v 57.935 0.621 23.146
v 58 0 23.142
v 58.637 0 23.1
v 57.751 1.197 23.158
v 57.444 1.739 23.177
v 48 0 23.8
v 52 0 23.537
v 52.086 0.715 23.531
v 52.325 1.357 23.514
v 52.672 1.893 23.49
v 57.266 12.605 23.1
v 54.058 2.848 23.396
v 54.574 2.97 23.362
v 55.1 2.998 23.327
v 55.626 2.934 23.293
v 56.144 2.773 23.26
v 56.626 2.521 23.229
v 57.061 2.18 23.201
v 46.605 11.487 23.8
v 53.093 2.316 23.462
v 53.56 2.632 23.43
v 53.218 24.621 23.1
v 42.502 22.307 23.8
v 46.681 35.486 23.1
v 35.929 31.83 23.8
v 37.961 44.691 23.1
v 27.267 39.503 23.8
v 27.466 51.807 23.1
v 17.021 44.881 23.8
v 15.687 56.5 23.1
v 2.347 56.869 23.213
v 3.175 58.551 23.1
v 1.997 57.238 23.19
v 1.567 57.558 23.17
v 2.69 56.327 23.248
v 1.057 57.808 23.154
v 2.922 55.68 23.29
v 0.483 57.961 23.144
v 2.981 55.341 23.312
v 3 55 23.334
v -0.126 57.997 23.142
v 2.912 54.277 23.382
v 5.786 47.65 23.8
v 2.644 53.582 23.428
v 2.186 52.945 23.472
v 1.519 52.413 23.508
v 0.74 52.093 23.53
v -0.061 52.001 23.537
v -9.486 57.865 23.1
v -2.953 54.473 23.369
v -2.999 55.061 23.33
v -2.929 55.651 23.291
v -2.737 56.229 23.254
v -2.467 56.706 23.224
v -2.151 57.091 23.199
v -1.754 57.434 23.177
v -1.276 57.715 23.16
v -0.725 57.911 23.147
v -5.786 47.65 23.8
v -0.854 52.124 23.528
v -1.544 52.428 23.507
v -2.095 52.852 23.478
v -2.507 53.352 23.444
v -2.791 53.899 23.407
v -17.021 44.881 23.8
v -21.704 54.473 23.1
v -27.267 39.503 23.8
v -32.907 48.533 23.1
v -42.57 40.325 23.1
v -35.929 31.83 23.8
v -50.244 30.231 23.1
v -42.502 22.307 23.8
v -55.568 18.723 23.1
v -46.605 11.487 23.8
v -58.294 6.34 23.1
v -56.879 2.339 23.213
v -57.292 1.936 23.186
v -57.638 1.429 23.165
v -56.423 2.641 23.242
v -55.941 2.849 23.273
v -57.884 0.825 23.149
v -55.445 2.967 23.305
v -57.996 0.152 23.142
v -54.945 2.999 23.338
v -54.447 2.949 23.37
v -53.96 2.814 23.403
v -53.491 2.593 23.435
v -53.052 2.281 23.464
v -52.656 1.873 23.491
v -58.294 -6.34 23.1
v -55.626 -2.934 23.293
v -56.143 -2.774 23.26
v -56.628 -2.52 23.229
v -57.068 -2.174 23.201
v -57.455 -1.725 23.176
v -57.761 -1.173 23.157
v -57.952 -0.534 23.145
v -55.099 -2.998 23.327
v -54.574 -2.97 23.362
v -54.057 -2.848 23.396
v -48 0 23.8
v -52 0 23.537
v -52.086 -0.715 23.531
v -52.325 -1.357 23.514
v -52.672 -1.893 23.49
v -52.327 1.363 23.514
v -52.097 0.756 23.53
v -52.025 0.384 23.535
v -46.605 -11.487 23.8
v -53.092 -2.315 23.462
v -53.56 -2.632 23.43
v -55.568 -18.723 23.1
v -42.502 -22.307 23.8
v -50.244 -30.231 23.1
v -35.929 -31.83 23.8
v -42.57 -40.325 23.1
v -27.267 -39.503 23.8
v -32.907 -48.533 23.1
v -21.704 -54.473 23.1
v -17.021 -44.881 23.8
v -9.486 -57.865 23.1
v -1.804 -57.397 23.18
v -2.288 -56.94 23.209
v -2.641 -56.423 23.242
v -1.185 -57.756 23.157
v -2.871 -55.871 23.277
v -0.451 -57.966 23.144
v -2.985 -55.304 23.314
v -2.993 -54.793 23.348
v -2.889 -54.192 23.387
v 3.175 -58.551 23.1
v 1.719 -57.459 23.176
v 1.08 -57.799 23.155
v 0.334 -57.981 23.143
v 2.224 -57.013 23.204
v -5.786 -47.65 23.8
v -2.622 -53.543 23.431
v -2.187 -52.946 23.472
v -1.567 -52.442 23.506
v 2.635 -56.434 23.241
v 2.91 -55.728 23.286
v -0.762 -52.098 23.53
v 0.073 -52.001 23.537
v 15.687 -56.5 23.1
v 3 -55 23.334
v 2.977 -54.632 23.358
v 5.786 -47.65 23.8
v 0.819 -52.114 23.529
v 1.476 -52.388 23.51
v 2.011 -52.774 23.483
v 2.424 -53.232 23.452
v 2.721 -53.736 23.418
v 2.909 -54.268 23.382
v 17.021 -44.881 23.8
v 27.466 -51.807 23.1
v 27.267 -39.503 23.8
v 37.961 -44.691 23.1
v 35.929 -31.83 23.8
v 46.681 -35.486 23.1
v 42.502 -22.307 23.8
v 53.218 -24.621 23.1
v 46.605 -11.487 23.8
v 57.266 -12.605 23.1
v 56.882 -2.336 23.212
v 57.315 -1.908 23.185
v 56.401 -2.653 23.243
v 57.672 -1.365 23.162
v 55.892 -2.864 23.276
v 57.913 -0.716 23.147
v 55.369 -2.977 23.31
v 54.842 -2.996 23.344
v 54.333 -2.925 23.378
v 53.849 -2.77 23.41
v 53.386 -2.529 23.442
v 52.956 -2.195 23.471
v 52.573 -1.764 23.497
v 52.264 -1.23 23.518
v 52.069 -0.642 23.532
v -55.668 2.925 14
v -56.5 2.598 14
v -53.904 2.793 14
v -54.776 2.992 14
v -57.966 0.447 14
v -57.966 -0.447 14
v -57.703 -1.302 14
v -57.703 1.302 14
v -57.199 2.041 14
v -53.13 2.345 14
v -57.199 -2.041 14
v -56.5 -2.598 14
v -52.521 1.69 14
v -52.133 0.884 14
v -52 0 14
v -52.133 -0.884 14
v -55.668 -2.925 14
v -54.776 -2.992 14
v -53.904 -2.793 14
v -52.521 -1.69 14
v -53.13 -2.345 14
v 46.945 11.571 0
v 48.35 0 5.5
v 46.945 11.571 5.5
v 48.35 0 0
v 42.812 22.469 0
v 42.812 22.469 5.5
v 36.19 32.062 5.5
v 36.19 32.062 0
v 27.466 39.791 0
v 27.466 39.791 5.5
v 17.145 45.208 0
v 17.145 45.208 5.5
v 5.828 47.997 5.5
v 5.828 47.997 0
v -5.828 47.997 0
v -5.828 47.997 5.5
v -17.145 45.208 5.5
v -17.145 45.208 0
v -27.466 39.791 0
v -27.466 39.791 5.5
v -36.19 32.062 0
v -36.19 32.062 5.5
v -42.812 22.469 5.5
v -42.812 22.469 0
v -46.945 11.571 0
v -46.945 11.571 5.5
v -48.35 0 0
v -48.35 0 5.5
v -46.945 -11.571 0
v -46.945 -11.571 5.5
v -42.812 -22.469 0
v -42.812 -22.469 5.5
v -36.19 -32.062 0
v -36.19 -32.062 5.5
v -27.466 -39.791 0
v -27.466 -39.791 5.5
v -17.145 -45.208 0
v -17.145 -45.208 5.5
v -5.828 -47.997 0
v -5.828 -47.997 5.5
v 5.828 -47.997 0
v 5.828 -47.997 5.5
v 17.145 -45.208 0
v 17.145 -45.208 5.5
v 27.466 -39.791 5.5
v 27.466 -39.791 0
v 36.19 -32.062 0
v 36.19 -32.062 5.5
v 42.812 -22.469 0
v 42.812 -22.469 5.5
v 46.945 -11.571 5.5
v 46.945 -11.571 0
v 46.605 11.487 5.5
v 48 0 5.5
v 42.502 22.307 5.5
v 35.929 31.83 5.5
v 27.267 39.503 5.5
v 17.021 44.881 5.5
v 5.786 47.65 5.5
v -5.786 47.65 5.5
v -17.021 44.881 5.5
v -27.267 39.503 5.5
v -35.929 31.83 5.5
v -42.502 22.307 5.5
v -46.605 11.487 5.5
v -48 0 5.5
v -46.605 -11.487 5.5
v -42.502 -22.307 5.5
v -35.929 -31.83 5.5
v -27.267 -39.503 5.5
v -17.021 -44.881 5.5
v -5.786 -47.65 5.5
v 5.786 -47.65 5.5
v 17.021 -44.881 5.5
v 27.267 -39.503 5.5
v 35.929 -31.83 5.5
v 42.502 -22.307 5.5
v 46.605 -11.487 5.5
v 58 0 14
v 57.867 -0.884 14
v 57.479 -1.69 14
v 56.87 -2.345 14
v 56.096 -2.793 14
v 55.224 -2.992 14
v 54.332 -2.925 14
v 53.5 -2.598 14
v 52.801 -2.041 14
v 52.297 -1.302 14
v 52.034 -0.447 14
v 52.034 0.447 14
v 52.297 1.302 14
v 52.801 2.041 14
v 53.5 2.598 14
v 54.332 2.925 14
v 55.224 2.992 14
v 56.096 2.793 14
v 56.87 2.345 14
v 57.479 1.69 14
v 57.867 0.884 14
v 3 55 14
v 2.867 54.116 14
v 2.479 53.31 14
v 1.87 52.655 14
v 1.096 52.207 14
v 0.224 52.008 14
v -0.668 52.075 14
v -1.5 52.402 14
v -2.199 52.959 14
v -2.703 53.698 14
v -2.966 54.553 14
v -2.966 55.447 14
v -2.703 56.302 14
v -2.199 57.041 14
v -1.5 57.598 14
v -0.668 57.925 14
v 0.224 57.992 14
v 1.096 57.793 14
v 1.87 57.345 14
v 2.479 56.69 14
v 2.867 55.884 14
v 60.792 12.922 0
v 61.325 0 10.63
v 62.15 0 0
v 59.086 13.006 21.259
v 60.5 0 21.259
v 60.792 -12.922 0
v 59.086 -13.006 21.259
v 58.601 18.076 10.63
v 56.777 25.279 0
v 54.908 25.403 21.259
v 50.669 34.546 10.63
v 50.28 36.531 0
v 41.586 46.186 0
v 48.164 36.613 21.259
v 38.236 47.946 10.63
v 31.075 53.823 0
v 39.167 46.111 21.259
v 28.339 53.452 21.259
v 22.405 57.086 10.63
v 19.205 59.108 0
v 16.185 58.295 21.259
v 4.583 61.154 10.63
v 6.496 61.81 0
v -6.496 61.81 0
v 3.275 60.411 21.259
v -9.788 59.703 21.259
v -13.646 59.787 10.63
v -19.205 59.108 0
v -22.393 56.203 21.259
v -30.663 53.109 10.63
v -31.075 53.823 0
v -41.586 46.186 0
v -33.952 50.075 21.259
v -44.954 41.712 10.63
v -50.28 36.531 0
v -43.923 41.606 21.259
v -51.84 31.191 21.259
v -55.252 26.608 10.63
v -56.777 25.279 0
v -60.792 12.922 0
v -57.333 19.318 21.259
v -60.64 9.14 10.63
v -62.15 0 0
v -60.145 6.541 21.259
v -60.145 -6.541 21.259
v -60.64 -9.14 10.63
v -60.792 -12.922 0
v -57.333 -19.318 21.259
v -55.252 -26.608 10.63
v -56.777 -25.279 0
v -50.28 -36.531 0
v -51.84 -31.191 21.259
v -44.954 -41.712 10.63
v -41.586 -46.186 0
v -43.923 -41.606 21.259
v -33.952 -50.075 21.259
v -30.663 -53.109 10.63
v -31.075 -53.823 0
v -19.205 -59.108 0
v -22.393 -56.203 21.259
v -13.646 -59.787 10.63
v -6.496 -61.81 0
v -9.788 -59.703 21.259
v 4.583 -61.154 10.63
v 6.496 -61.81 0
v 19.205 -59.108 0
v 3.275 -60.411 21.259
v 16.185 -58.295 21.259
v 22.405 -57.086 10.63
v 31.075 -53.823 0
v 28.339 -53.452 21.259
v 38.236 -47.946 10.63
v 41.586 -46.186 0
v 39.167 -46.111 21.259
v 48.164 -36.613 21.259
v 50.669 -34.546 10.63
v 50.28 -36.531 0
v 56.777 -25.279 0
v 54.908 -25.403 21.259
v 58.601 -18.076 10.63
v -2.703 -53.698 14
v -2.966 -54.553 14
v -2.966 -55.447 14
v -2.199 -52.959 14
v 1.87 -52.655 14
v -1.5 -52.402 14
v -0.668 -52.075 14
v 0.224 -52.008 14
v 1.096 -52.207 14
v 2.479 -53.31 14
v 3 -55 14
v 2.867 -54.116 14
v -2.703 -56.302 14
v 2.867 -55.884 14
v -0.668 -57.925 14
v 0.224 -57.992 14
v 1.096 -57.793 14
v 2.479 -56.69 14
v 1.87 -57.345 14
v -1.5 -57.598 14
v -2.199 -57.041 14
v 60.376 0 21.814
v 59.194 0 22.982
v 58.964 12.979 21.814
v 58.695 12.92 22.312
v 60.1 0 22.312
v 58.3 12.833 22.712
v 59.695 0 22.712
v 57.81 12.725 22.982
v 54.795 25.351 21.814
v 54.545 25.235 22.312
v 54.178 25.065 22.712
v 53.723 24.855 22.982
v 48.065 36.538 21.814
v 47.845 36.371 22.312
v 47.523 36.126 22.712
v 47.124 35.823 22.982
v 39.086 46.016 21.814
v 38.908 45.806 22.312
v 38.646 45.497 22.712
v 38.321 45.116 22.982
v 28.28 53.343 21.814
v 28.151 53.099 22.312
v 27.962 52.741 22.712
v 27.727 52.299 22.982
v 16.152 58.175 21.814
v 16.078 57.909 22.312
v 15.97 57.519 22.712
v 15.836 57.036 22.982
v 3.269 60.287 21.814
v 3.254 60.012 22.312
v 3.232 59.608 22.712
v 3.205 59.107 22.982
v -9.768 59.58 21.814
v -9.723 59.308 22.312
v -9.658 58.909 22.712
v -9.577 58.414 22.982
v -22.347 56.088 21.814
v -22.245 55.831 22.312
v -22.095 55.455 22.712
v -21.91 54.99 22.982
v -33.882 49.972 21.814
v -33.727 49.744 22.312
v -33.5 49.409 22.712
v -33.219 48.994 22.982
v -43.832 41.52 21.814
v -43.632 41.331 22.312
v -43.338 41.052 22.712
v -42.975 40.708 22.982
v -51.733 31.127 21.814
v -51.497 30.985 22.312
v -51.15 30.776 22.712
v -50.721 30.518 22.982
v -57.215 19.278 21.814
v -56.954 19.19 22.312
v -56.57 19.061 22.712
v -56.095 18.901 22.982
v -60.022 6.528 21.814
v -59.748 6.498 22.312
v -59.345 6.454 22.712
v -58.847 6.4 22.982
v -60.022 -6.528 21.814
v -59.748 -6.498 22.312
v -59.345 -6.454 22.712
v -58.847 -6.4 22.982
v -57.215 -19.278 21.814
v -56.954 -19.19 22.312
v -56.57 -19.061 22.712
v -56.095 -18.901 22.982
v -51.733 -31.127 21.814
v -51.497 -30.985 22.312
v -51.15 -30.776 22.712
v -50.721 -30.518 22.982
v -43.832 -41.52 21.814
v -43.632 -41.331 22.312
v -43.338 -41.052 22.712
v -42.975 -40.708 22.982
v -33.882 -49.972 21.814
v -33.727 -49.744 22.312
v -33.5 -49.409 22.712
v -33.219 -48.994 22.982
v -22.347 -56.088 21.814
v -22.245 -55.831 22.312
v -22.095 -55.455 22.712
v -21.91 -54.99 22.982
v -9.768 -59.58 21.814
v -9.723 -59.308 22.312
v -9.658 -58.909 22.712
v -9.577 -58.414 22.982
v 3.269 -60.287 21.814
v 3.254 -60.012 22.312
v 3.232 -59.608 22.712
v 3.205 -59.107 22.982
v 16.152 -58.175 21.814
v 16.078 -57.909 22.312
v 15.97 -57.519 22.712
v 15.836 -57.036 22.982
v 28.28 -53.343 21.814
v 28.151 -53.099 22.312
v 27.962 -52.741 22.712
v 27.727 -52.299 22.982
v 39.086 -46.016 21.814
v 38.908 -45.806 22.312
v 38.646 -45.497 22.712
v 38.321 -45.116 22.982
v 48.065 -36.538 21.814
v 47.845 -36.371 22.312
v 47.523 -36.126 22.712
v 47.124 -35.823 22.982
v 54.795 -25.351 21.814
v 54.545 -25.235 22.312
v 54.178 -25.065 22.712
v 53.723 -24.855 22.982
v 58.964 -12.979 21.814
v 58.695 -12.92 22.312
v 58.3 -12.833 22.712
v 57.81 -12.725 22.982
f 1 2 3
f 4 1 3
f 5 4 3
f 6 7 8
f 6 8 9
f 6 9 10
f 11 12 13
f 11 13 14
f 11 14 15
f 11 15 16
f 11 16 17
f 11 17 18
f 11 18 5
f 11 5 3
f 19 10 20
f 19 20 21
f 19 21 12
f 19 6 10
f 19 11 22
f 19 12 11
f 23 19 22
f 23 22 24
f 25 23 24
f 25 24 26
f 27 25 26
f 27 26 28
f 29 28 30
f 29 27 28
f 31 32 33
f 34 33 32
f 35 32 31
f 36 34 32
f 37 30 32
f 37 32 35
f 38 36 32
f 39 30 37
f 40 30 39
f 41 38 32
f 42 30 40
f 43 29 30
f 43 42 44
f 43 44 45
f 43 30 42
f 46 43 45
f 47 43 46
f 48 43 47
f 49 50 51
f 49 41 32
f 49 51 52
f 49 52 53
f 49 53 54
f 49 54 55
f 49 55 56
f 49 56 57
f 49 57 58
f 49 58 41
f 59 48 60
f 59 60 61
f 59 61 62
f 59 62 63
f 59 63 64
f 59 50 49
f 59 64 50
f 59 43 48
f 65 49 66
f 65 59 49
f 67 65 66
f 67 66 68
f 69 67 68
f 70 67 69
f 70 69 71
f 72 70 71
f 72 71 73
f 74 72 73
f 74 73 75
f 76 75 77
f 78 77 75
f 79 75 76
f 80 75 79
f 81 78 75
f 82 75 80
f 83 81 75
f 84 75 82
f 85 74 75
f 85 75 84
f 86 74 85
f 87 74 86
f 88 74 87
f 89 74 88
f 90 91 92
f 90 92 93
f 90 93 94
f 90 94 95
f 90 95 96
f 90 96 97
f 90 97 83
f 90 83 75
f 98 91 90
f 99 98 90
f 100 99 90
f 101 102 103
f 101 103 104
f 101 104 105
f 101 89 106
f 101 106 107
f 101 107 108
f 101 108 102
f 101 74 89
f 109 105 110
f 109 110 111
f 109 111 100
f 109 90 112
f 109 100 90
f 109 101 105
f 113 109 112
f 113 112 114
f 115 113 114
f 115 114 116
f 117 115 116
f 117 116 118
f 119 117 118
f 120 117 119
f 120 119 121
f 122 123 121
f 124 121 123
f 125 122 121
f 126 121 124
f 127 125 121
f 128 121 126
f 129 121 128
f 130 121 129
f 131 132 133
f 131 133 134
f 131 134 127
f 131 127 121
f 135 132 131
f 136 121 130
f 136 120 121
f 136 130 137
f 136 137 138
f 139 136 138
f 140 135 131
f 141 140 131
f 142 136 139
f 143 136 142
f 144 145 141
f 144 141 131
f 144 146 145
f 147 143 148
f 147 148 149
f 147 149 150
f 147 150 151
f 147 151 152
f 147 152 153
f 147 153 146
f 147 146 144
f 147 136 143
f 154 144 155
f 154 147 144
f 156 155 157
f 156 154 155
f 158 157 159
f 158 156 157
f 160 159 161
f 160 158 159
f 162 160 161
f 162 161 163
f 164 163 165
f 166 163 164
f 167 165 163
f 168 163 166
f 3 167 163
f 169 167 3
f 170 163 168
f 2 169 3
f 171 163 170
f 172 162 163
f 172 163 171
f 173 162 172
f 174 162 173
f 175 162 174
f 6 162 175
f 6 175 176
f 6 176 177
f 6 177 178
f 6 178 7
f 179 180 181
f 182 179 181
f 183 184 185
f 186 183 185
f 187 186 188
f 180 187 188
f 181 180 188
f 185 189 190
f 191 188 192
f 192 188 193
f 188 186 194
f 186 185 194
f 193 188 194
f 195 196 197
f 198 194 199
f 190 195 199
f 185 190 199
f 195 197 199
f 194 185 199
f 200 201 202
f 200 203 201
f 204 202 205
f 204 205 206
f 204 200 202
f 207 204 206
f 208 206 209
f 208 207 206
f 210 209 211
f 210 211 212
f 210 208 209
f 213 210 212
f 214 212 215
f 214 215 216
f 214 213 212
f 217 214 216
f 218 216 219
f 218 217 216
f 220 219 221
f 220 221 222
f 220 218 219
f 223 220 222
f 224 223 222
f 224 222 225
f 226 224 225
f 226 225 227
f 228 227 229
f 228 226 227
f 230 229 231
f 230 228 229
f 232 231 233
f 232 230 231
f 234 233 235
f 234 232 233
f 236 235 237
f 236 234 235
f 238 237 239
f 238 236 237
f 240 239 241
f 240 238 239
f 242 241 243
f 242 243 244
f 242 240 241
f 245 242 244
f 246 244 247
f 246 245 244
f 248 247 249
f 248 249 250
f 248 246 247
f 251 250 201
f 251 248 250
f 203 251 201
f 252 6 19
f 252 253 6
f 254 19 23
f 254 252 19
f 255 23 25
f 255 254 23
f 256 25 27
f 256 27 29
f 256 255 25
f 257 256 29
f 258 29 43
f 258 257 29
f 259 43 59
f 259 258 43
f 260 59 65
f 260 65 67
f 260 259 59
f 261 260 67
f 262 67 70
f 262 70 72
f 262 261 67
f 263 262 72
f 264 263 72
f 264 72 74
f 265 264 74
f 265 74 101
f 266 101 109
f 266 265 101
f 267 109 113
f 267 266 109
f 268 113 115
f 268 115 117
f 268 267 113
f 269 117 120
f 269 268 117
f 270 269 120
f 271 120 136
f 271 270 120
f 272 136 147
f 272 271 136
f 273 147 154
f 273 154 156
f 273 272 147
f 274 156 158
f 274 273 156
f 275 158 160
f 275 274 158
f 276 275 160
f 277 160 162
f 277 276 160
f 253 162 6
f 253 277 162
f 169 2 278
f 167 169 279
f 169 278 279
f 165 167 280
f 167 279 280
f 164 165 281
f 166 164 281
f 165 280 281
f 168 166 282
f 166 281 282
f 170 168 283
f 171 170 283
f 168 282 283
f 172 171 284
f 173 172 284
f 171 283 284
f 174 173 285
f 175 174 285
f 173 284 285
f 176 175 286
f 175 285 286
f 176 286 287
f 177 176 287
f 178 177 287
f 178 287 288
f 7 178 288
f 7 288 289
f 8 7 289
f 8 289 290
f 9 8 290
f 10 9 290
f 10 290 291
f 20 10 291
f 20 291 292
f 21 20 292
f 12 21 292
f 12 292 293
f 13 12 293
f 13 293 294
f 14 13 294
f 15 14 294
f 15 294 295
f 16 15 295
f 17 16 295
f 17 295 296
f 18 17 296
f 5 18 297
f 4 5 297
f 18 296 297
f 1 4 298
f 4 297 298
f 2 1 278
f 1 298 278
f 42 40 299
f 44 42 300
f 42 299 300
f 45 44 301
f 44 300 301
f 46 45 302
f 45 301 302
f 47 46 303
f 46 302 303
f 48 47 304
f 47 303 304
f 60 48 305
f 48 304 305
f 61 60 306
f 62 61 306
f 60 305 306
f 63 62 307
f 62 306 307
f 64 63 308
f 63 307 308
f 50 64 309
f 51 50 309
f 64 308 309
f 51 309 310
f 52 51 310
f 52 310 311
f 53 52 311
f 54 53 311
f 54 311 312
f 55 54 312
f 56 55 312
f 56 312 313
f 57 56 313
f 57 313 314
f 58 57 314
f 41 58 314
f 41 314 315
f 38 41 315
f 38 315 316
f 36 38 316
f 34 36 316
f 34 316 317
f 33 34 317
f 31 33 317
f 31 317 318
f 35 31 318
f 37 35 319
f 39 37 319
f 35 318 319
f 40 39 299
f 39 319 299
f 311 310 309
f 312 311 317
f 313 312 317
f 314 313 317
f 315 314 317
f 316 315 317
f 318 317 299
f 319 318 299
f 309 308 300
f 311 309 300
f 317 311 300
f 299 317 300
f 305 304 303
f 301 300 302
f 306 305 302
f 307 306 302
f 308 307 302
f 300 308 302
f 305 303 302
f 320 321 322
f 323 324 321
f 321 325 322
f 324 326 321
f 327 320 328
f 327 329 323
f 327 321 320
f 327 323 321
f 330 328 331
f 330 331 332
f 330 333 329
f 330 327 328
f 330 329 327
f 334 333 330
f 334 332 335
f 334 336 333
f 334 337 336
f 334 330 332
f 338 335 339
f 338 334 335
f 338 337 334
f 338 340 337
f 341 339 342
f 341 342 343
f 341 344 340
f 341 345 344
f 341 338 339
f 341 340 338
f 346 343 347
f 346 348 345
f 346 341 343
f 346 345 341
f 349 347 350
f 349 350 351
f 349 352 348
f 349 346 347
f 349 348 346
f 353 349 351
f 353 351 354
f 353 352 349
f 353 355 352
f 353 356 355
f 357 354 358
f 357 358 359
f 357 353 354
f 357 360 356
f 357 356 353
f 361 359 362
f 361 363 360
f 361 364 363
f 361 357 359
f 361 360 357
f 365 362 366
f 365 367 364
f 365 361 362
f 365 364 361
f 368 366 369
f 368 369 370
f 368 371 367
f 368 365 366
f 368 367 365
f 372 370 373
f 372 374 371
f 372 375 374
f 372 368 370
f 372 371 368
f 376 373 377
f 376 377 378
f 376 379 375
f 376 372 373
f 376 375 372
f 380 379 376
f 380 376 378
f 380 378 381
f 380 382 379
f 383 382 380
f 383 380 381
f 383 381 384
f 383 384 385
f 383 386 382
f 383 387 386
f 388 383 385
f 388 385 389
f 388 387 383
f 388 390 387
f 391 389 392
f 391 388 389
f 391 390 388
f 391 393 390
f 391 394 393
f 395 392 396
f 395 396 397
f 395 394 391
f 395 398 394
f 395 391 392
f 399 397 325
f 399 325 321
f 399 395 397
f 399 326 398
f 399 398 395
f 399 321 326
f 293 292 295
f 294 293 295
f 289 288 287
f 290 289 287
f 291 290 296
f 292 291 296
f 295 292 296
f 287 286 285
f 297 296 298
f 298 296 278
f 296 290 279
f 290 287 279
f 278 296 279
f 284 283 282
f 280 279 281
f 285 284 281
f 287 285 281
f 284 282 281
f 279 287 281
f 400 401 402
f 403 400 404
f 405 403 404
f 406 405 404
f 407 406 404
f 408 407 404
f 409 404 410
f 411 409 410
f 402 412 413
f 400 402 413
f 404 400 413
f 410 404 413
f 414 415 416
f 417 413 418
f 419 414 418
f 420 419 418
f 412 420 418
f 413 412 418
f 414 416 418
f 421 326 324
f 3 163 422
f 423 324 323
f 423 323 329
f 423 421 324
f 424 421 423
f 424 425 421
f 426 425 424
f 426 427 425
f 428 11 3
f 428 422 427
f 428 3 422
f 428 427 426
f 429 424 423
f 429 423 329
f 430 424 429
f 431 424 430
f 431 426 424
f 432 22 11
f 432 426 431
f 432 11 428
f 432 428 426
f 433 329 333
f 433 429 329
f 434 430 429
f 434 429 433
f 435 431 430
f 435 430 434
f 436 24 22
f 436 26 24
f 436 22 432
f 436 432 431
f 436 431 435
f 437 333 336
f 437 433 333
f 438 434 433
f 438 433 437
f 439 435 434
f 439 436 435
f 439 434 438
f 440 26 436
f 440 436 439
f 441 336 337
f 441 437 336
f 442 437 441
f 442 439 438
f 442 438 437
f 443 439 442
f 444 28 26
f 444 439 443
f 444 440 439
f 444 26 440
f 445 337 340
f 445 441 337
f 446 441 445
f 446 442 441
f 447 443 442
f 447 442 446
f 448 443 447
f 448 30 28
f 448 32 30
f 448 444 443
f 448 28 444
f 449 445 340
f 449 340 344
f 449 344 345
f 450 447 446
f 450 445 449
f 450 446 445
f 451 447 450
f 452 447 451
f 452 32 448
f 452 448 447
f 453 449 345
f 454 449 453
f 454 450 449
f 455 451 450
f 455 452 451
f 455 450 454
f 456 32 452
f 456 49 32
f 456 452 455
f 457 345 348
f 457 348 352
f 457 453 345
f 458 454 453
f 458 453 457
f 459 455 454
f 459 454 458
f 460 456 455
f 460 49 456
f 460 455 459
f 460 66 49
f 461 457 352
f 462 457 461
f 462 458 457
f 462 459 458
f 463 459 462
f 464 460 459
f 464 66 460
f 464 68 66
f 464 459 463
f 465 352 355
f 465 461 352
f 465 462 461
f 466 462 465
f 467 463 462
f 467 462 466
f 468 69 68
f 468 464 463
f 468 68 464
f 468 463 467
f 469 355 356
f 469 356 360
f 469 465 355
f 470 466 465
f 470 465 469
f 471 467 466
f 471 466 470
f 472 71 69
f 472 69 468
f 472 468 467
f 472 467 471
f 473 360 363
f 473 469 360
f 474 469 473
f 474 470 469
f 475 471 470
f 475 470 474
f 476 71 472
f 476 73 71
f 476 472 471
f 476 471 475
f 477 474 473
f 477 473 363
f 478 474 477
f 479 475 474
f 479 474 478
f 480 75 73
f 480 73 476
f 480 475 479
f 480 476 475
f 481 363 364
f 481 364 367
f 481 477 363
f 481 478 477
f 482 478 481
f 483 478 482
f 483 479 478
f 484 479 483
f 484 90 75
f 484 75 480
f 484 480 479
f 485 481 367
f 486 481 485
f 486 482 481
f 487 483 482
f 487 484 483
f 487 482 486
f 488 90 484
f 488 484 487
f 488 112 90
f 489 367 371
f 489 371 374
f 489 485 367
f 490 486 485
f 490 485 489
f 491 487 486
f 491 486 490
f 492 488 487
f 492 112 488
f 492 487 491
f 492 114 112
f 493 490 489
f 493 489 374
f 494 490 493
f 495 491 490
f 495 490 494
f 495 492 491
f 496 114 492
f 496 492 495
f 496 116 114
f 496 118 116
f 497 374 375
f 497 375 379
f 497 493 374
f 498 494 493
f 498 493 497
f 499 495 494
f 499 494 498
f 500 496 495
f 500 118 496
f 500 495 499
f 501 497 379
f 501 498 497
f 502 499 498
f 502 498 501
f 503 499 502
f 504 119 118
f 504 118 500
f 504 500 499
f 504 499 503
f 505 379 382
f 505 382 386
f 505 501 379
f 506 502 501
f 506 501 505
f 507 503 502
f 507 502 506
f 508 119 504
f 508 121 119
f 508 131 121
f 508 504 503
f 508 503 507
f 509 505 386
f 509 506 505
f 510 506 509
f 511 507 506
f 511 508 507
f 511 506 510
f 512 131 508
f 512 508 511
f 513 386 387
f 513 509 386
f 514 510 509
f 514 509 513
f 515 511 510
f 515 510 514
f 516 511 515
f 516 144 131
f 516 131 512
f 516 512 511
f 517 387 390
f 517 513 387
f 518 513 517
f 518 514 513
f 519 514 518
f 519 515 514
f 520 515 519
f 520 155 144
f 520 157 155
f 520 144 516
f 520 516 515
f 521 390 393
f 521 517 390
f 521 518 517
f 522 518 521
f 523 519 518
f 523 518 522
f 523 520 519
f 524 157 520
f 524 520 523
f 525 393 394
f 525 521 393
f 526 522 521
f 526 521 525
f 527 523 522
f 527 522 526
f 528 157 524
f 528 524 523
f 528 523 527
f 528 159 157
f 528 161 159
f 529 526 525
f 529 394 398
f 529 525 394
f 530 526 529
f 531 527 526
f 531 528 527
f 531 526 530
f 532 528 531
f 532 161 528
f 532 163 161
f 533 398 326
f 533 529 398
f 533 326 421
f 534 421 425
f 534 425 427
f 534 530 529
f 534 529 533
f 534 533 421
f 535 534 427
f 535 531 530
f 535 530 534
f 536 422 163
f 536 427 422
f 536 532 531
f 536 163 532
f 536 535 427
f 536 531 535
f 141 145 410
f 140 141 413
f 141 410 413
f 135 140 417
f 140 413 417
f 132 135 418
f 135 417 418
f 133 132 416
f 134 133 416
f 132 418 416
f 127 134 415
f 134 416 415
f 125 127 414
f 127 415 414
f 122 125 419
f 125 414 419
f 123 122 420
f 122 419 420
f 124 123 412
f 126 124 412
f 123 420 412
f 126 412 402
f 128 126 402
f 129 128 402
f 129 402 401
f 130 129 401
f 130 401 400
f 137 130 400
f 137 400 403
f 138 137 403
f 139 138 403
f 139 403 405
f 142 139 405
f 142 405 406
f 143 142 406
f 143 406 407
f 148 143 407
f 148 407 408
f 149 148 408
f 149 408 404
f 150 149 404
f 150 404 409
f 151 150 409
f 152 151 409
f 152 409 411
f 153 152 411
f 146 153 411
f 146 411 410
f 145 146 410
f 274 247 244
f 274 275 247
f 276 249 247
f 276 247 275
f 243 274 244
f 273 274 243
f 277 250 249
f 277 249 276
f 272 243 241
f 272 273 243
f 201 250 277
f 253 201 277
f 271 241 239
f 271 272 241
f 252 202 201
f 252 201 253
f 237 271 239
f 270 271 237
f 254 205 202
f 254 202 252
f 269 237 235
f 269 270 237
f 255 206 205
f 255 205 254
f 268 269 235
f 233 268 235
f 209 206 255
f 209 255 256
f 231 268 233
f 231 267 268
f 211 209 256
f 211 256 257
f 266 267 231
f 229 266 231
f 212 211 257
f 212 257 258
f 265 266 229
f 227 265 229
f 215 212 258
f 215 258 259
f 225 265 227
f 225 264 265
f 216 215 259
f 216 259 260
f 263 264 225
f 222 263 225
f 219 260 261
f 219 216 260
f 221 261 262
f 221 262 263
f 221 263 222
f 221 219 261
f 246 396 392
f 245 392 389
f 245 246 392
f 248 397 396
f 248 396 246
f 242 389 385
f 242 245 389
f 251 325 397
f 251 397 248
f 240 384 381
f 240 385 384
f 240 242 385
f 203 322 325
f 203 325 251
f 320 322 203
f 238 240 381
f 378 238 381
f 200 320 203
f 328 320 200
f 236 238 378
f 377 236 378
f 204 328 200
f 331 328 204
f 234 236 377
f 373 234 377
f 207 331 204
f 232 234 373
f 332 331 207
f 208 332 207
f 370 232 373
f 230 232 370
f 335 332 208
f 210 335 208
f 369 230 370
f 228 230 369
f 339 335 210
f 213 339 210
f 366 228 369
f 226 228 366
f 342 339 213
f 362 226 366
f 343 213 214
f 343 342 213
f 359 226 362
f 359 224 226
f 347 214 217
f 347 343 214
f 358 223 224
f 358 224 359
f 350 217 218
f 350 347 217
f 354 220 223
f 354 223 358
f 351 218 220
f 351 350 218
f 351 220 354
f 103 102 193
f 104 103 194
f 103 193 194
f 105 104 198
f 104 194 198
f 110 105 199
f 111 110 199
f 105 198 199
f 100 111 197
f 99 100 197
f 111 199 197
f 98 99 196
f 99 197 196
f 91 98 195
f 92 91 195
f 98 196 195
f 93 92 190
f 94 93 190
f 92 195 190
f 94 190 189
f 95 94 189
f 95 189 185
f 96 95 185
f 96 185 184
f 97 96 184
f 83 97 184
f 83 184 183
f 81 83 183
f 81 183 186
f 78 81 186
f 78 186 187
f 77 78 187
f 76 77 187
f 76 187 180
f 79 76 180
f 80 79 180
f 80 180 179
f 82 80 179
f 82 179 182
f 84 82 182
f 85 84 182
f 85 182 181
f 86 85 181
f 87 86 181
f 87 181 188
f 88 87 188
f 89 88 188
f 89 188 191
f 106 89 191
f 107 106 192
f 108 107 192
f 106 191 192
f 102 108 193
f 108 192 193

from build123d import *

# Parameters (mm, degrees)
F3_START = -14
F2_R     = 3
F3_DEPTH = 10


with BuildPart() as f1:
    # F0 (on Front) → F1 (revolve)
    with BuildSketch(Plane.XZ):
        with BuildLine():
            Line((48.35, 0), (62.15, 0))
            Line((62.15, 0), (60.5, 21.2590787789))
            ThreePointArc((60.5, 21.2590787789), (59.9118794302, 22.5268121601), (58.6373248293, 23.1))
            Line((58.6373248293, 23.1), (48, 23.8))
            Line((48, 23.8), (48, 5.5))
            Line((48, 5.5), (48.35, 5.5))
            Line((48.35, 5.5), (48.35, 0))
        make_face()
    revolve(axis=Axis((0, 0, 11.9790900654), (0, 0, 1)))

    # F2 (on face) → F3 (cut)
    with BuildSketch(Plane(origin=(0, 0, 0), x_dir=(1, 0, 0), z_dir=(0, 0, -1)).offset(F3_START)):
        with Locations((-55, 0)):
            Circle(F2_R)
        with Locations((0, 55)):
            Circle(F2_R)
        with Locations((55, 0)):
            Circle(F2_R)
        with Locations((0, -55)):
            Circle(F2_R)
    extrude(amount=-F3_DEPTH, mode=Mode.SUBTRACT)


solid = f1.part
